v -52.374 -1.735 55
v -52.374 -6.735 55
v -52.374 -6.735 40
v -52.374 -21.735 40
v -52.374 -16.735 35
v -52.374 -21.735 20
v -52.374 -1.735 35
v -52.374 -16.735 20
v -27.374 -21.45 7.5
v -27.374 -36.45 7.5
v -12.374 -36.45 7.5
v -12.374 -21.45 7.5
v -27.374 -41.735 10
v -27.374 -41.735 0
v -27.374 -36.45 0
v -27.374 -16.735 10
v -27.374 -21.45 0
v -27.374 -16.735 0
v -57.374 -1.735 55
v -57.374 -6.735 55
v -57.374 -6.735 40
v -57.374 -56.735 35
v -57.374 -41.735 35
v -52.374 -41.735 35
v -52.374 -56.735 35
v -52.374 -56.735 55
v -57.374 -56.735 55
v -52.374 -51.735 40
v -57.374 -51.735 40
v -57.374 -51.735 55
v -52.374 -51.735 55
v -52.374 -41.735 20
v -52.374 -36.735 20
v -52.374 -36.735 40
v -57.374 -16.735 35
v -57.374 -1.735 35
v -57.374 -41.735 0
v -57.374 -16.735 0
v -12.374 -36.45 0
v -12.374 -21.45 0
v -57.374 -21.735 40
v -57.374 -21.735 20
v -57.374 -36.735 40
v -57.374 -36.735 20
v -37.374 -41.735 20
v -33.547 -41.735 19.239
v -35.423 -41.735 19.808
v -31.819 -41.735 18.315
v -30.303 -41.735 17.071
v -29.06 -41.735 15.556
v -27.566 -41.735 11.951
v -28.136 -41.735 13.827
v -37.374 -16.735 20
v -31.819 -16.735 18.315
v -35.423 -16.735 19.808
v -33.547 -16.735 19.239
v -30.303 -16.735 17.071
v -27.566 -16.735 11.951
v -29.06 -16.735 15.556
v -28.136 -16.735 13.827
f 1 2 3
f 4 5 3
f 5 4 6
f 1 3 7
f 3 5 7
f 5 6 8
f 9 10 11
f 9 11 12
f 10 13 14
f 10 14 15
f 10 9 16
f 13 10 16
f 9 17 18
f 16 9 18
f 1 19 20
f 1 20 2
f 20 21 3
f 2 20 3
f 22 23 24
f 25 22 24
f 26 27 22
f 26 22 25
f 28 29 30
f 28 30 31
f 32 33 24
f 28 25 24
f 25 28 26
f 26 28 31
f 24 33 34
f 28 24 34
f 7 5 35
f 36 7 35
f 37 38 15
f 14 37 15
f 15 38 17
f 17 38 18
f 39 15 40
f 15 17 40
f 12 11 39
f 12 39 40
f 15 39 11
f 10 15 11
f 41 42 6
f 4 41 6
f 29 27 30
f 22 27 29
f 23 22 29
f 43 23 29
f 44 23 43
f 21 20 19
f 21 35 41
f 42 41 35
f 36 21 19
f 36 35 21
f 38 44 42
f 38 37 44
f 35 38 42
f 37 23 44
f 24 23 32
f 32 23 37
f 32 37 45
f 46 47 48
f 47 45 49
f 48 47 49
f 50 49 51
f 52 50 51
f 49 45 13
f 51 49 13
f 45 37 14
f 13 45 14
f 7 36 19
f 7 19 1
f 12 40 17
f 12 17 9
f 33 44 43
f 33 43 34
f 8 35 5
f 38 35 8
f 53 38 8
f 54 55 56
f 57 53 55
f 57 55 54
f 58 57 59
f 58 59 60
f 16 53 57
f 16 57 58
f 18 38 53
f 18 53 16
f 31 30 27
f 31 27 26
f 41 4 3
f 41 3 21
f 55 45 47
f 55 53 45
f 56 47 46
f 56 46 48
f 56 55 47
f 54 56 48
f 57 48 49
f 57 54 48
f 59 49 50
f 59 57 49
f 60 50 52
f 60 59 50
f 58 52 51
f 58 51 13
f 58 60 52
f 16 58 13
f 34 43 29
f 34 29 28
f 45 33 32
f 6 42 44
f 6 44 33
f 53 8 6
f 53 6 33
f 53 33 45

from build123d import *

# Parameters (mm, degrees)
F0_W      = 30
F0_H      = 25
F1_DEPTH  = 20
F2_W      = 15
F2_H      = 7.5
F3_DEPTH  = 15
F4_W      = 5
F4_H      = 5
F5_DEPTH  = 20
F6_W      = 5
F6_H      = 5
F7_DEPTH  = 15
F8_W      = 5
F8_H      = 5
F9_DEPTH  = 15
F10_W     = 5
F10_H     = 5
F11_W     = 5
F11_H     = 5
F12_DEPTH = 15
F13_R     = 10


with BuildPart() as f1:
    # F0 (on Top) → F1 (new body)
    with BuildSketch(Plane.XY):
        with Locations((-42.374329, -29.235112)):
            Rectangle(F0_W, F0_H)
    extrude(amount=F1_DEPTH)

    # F2 (on face) → F3 (join)
    with BuildSketch(Plane.YZ.offset(-27.374329)):
        with Locations((-28.950002, 3.75)):
            Rectangle(F2_W, F2_H)
    extrude(amount=F3_DEPTH)

    # F4 (on face) → F5 (join)
    with BuildSketch(Plane.XY.offset(20)):
        with Locations((-54.874329, -19.235112)):
            Rectangle(F4_W, F4_H)
        with Locations((-54.874329, -39.235112)):
            Rectangle(F4_W, F4_H)
    extrude(amount=F5_DEPTH)

    # F6 (on face) → F7 (join)
    with BuildSketch(Plane(origin=(0, -16.735112, 0), x_dir=(-1, 0, 0), z_dir=(0, 1, 0))):
        with Locations((54.874329, 37.5)):
            Rectangle(F6_W, F6_H)
    extrude(amount=F7_DEPTH)

    # F8 (on face) → F9 (join)
    with BuildSketch(Plane.XZ.offset(41.735112)):
        with Locations((-54.874329, 37.5)):
            Rectangle(F8_W, F8_H)
    extrude(amount=F9_DEPTH)

    # F10 (on face) + F11 (on face) → F12 (join)
    with BuildSketch(Plane.XY.offset(40)):
        with Locations((-54.874329, -4.235112)):
            Rectangle(F10_W, F10_H)
    with BuildSketch(Plane.XY.offset(40)):
        with Locations((-54.874329, -54.235112)):
            Rectangle(F11_W, F11_H)
    extrude(amount=F12_DEPTH)

    # F13
    f13_edges = [f1.edges().sort_by_distance(p)[0] for p in [
        (-27.374329, -29.235112, 20),
    ]]
    fillet(f13_edges, radius=F13_R)


solid = f1.part
